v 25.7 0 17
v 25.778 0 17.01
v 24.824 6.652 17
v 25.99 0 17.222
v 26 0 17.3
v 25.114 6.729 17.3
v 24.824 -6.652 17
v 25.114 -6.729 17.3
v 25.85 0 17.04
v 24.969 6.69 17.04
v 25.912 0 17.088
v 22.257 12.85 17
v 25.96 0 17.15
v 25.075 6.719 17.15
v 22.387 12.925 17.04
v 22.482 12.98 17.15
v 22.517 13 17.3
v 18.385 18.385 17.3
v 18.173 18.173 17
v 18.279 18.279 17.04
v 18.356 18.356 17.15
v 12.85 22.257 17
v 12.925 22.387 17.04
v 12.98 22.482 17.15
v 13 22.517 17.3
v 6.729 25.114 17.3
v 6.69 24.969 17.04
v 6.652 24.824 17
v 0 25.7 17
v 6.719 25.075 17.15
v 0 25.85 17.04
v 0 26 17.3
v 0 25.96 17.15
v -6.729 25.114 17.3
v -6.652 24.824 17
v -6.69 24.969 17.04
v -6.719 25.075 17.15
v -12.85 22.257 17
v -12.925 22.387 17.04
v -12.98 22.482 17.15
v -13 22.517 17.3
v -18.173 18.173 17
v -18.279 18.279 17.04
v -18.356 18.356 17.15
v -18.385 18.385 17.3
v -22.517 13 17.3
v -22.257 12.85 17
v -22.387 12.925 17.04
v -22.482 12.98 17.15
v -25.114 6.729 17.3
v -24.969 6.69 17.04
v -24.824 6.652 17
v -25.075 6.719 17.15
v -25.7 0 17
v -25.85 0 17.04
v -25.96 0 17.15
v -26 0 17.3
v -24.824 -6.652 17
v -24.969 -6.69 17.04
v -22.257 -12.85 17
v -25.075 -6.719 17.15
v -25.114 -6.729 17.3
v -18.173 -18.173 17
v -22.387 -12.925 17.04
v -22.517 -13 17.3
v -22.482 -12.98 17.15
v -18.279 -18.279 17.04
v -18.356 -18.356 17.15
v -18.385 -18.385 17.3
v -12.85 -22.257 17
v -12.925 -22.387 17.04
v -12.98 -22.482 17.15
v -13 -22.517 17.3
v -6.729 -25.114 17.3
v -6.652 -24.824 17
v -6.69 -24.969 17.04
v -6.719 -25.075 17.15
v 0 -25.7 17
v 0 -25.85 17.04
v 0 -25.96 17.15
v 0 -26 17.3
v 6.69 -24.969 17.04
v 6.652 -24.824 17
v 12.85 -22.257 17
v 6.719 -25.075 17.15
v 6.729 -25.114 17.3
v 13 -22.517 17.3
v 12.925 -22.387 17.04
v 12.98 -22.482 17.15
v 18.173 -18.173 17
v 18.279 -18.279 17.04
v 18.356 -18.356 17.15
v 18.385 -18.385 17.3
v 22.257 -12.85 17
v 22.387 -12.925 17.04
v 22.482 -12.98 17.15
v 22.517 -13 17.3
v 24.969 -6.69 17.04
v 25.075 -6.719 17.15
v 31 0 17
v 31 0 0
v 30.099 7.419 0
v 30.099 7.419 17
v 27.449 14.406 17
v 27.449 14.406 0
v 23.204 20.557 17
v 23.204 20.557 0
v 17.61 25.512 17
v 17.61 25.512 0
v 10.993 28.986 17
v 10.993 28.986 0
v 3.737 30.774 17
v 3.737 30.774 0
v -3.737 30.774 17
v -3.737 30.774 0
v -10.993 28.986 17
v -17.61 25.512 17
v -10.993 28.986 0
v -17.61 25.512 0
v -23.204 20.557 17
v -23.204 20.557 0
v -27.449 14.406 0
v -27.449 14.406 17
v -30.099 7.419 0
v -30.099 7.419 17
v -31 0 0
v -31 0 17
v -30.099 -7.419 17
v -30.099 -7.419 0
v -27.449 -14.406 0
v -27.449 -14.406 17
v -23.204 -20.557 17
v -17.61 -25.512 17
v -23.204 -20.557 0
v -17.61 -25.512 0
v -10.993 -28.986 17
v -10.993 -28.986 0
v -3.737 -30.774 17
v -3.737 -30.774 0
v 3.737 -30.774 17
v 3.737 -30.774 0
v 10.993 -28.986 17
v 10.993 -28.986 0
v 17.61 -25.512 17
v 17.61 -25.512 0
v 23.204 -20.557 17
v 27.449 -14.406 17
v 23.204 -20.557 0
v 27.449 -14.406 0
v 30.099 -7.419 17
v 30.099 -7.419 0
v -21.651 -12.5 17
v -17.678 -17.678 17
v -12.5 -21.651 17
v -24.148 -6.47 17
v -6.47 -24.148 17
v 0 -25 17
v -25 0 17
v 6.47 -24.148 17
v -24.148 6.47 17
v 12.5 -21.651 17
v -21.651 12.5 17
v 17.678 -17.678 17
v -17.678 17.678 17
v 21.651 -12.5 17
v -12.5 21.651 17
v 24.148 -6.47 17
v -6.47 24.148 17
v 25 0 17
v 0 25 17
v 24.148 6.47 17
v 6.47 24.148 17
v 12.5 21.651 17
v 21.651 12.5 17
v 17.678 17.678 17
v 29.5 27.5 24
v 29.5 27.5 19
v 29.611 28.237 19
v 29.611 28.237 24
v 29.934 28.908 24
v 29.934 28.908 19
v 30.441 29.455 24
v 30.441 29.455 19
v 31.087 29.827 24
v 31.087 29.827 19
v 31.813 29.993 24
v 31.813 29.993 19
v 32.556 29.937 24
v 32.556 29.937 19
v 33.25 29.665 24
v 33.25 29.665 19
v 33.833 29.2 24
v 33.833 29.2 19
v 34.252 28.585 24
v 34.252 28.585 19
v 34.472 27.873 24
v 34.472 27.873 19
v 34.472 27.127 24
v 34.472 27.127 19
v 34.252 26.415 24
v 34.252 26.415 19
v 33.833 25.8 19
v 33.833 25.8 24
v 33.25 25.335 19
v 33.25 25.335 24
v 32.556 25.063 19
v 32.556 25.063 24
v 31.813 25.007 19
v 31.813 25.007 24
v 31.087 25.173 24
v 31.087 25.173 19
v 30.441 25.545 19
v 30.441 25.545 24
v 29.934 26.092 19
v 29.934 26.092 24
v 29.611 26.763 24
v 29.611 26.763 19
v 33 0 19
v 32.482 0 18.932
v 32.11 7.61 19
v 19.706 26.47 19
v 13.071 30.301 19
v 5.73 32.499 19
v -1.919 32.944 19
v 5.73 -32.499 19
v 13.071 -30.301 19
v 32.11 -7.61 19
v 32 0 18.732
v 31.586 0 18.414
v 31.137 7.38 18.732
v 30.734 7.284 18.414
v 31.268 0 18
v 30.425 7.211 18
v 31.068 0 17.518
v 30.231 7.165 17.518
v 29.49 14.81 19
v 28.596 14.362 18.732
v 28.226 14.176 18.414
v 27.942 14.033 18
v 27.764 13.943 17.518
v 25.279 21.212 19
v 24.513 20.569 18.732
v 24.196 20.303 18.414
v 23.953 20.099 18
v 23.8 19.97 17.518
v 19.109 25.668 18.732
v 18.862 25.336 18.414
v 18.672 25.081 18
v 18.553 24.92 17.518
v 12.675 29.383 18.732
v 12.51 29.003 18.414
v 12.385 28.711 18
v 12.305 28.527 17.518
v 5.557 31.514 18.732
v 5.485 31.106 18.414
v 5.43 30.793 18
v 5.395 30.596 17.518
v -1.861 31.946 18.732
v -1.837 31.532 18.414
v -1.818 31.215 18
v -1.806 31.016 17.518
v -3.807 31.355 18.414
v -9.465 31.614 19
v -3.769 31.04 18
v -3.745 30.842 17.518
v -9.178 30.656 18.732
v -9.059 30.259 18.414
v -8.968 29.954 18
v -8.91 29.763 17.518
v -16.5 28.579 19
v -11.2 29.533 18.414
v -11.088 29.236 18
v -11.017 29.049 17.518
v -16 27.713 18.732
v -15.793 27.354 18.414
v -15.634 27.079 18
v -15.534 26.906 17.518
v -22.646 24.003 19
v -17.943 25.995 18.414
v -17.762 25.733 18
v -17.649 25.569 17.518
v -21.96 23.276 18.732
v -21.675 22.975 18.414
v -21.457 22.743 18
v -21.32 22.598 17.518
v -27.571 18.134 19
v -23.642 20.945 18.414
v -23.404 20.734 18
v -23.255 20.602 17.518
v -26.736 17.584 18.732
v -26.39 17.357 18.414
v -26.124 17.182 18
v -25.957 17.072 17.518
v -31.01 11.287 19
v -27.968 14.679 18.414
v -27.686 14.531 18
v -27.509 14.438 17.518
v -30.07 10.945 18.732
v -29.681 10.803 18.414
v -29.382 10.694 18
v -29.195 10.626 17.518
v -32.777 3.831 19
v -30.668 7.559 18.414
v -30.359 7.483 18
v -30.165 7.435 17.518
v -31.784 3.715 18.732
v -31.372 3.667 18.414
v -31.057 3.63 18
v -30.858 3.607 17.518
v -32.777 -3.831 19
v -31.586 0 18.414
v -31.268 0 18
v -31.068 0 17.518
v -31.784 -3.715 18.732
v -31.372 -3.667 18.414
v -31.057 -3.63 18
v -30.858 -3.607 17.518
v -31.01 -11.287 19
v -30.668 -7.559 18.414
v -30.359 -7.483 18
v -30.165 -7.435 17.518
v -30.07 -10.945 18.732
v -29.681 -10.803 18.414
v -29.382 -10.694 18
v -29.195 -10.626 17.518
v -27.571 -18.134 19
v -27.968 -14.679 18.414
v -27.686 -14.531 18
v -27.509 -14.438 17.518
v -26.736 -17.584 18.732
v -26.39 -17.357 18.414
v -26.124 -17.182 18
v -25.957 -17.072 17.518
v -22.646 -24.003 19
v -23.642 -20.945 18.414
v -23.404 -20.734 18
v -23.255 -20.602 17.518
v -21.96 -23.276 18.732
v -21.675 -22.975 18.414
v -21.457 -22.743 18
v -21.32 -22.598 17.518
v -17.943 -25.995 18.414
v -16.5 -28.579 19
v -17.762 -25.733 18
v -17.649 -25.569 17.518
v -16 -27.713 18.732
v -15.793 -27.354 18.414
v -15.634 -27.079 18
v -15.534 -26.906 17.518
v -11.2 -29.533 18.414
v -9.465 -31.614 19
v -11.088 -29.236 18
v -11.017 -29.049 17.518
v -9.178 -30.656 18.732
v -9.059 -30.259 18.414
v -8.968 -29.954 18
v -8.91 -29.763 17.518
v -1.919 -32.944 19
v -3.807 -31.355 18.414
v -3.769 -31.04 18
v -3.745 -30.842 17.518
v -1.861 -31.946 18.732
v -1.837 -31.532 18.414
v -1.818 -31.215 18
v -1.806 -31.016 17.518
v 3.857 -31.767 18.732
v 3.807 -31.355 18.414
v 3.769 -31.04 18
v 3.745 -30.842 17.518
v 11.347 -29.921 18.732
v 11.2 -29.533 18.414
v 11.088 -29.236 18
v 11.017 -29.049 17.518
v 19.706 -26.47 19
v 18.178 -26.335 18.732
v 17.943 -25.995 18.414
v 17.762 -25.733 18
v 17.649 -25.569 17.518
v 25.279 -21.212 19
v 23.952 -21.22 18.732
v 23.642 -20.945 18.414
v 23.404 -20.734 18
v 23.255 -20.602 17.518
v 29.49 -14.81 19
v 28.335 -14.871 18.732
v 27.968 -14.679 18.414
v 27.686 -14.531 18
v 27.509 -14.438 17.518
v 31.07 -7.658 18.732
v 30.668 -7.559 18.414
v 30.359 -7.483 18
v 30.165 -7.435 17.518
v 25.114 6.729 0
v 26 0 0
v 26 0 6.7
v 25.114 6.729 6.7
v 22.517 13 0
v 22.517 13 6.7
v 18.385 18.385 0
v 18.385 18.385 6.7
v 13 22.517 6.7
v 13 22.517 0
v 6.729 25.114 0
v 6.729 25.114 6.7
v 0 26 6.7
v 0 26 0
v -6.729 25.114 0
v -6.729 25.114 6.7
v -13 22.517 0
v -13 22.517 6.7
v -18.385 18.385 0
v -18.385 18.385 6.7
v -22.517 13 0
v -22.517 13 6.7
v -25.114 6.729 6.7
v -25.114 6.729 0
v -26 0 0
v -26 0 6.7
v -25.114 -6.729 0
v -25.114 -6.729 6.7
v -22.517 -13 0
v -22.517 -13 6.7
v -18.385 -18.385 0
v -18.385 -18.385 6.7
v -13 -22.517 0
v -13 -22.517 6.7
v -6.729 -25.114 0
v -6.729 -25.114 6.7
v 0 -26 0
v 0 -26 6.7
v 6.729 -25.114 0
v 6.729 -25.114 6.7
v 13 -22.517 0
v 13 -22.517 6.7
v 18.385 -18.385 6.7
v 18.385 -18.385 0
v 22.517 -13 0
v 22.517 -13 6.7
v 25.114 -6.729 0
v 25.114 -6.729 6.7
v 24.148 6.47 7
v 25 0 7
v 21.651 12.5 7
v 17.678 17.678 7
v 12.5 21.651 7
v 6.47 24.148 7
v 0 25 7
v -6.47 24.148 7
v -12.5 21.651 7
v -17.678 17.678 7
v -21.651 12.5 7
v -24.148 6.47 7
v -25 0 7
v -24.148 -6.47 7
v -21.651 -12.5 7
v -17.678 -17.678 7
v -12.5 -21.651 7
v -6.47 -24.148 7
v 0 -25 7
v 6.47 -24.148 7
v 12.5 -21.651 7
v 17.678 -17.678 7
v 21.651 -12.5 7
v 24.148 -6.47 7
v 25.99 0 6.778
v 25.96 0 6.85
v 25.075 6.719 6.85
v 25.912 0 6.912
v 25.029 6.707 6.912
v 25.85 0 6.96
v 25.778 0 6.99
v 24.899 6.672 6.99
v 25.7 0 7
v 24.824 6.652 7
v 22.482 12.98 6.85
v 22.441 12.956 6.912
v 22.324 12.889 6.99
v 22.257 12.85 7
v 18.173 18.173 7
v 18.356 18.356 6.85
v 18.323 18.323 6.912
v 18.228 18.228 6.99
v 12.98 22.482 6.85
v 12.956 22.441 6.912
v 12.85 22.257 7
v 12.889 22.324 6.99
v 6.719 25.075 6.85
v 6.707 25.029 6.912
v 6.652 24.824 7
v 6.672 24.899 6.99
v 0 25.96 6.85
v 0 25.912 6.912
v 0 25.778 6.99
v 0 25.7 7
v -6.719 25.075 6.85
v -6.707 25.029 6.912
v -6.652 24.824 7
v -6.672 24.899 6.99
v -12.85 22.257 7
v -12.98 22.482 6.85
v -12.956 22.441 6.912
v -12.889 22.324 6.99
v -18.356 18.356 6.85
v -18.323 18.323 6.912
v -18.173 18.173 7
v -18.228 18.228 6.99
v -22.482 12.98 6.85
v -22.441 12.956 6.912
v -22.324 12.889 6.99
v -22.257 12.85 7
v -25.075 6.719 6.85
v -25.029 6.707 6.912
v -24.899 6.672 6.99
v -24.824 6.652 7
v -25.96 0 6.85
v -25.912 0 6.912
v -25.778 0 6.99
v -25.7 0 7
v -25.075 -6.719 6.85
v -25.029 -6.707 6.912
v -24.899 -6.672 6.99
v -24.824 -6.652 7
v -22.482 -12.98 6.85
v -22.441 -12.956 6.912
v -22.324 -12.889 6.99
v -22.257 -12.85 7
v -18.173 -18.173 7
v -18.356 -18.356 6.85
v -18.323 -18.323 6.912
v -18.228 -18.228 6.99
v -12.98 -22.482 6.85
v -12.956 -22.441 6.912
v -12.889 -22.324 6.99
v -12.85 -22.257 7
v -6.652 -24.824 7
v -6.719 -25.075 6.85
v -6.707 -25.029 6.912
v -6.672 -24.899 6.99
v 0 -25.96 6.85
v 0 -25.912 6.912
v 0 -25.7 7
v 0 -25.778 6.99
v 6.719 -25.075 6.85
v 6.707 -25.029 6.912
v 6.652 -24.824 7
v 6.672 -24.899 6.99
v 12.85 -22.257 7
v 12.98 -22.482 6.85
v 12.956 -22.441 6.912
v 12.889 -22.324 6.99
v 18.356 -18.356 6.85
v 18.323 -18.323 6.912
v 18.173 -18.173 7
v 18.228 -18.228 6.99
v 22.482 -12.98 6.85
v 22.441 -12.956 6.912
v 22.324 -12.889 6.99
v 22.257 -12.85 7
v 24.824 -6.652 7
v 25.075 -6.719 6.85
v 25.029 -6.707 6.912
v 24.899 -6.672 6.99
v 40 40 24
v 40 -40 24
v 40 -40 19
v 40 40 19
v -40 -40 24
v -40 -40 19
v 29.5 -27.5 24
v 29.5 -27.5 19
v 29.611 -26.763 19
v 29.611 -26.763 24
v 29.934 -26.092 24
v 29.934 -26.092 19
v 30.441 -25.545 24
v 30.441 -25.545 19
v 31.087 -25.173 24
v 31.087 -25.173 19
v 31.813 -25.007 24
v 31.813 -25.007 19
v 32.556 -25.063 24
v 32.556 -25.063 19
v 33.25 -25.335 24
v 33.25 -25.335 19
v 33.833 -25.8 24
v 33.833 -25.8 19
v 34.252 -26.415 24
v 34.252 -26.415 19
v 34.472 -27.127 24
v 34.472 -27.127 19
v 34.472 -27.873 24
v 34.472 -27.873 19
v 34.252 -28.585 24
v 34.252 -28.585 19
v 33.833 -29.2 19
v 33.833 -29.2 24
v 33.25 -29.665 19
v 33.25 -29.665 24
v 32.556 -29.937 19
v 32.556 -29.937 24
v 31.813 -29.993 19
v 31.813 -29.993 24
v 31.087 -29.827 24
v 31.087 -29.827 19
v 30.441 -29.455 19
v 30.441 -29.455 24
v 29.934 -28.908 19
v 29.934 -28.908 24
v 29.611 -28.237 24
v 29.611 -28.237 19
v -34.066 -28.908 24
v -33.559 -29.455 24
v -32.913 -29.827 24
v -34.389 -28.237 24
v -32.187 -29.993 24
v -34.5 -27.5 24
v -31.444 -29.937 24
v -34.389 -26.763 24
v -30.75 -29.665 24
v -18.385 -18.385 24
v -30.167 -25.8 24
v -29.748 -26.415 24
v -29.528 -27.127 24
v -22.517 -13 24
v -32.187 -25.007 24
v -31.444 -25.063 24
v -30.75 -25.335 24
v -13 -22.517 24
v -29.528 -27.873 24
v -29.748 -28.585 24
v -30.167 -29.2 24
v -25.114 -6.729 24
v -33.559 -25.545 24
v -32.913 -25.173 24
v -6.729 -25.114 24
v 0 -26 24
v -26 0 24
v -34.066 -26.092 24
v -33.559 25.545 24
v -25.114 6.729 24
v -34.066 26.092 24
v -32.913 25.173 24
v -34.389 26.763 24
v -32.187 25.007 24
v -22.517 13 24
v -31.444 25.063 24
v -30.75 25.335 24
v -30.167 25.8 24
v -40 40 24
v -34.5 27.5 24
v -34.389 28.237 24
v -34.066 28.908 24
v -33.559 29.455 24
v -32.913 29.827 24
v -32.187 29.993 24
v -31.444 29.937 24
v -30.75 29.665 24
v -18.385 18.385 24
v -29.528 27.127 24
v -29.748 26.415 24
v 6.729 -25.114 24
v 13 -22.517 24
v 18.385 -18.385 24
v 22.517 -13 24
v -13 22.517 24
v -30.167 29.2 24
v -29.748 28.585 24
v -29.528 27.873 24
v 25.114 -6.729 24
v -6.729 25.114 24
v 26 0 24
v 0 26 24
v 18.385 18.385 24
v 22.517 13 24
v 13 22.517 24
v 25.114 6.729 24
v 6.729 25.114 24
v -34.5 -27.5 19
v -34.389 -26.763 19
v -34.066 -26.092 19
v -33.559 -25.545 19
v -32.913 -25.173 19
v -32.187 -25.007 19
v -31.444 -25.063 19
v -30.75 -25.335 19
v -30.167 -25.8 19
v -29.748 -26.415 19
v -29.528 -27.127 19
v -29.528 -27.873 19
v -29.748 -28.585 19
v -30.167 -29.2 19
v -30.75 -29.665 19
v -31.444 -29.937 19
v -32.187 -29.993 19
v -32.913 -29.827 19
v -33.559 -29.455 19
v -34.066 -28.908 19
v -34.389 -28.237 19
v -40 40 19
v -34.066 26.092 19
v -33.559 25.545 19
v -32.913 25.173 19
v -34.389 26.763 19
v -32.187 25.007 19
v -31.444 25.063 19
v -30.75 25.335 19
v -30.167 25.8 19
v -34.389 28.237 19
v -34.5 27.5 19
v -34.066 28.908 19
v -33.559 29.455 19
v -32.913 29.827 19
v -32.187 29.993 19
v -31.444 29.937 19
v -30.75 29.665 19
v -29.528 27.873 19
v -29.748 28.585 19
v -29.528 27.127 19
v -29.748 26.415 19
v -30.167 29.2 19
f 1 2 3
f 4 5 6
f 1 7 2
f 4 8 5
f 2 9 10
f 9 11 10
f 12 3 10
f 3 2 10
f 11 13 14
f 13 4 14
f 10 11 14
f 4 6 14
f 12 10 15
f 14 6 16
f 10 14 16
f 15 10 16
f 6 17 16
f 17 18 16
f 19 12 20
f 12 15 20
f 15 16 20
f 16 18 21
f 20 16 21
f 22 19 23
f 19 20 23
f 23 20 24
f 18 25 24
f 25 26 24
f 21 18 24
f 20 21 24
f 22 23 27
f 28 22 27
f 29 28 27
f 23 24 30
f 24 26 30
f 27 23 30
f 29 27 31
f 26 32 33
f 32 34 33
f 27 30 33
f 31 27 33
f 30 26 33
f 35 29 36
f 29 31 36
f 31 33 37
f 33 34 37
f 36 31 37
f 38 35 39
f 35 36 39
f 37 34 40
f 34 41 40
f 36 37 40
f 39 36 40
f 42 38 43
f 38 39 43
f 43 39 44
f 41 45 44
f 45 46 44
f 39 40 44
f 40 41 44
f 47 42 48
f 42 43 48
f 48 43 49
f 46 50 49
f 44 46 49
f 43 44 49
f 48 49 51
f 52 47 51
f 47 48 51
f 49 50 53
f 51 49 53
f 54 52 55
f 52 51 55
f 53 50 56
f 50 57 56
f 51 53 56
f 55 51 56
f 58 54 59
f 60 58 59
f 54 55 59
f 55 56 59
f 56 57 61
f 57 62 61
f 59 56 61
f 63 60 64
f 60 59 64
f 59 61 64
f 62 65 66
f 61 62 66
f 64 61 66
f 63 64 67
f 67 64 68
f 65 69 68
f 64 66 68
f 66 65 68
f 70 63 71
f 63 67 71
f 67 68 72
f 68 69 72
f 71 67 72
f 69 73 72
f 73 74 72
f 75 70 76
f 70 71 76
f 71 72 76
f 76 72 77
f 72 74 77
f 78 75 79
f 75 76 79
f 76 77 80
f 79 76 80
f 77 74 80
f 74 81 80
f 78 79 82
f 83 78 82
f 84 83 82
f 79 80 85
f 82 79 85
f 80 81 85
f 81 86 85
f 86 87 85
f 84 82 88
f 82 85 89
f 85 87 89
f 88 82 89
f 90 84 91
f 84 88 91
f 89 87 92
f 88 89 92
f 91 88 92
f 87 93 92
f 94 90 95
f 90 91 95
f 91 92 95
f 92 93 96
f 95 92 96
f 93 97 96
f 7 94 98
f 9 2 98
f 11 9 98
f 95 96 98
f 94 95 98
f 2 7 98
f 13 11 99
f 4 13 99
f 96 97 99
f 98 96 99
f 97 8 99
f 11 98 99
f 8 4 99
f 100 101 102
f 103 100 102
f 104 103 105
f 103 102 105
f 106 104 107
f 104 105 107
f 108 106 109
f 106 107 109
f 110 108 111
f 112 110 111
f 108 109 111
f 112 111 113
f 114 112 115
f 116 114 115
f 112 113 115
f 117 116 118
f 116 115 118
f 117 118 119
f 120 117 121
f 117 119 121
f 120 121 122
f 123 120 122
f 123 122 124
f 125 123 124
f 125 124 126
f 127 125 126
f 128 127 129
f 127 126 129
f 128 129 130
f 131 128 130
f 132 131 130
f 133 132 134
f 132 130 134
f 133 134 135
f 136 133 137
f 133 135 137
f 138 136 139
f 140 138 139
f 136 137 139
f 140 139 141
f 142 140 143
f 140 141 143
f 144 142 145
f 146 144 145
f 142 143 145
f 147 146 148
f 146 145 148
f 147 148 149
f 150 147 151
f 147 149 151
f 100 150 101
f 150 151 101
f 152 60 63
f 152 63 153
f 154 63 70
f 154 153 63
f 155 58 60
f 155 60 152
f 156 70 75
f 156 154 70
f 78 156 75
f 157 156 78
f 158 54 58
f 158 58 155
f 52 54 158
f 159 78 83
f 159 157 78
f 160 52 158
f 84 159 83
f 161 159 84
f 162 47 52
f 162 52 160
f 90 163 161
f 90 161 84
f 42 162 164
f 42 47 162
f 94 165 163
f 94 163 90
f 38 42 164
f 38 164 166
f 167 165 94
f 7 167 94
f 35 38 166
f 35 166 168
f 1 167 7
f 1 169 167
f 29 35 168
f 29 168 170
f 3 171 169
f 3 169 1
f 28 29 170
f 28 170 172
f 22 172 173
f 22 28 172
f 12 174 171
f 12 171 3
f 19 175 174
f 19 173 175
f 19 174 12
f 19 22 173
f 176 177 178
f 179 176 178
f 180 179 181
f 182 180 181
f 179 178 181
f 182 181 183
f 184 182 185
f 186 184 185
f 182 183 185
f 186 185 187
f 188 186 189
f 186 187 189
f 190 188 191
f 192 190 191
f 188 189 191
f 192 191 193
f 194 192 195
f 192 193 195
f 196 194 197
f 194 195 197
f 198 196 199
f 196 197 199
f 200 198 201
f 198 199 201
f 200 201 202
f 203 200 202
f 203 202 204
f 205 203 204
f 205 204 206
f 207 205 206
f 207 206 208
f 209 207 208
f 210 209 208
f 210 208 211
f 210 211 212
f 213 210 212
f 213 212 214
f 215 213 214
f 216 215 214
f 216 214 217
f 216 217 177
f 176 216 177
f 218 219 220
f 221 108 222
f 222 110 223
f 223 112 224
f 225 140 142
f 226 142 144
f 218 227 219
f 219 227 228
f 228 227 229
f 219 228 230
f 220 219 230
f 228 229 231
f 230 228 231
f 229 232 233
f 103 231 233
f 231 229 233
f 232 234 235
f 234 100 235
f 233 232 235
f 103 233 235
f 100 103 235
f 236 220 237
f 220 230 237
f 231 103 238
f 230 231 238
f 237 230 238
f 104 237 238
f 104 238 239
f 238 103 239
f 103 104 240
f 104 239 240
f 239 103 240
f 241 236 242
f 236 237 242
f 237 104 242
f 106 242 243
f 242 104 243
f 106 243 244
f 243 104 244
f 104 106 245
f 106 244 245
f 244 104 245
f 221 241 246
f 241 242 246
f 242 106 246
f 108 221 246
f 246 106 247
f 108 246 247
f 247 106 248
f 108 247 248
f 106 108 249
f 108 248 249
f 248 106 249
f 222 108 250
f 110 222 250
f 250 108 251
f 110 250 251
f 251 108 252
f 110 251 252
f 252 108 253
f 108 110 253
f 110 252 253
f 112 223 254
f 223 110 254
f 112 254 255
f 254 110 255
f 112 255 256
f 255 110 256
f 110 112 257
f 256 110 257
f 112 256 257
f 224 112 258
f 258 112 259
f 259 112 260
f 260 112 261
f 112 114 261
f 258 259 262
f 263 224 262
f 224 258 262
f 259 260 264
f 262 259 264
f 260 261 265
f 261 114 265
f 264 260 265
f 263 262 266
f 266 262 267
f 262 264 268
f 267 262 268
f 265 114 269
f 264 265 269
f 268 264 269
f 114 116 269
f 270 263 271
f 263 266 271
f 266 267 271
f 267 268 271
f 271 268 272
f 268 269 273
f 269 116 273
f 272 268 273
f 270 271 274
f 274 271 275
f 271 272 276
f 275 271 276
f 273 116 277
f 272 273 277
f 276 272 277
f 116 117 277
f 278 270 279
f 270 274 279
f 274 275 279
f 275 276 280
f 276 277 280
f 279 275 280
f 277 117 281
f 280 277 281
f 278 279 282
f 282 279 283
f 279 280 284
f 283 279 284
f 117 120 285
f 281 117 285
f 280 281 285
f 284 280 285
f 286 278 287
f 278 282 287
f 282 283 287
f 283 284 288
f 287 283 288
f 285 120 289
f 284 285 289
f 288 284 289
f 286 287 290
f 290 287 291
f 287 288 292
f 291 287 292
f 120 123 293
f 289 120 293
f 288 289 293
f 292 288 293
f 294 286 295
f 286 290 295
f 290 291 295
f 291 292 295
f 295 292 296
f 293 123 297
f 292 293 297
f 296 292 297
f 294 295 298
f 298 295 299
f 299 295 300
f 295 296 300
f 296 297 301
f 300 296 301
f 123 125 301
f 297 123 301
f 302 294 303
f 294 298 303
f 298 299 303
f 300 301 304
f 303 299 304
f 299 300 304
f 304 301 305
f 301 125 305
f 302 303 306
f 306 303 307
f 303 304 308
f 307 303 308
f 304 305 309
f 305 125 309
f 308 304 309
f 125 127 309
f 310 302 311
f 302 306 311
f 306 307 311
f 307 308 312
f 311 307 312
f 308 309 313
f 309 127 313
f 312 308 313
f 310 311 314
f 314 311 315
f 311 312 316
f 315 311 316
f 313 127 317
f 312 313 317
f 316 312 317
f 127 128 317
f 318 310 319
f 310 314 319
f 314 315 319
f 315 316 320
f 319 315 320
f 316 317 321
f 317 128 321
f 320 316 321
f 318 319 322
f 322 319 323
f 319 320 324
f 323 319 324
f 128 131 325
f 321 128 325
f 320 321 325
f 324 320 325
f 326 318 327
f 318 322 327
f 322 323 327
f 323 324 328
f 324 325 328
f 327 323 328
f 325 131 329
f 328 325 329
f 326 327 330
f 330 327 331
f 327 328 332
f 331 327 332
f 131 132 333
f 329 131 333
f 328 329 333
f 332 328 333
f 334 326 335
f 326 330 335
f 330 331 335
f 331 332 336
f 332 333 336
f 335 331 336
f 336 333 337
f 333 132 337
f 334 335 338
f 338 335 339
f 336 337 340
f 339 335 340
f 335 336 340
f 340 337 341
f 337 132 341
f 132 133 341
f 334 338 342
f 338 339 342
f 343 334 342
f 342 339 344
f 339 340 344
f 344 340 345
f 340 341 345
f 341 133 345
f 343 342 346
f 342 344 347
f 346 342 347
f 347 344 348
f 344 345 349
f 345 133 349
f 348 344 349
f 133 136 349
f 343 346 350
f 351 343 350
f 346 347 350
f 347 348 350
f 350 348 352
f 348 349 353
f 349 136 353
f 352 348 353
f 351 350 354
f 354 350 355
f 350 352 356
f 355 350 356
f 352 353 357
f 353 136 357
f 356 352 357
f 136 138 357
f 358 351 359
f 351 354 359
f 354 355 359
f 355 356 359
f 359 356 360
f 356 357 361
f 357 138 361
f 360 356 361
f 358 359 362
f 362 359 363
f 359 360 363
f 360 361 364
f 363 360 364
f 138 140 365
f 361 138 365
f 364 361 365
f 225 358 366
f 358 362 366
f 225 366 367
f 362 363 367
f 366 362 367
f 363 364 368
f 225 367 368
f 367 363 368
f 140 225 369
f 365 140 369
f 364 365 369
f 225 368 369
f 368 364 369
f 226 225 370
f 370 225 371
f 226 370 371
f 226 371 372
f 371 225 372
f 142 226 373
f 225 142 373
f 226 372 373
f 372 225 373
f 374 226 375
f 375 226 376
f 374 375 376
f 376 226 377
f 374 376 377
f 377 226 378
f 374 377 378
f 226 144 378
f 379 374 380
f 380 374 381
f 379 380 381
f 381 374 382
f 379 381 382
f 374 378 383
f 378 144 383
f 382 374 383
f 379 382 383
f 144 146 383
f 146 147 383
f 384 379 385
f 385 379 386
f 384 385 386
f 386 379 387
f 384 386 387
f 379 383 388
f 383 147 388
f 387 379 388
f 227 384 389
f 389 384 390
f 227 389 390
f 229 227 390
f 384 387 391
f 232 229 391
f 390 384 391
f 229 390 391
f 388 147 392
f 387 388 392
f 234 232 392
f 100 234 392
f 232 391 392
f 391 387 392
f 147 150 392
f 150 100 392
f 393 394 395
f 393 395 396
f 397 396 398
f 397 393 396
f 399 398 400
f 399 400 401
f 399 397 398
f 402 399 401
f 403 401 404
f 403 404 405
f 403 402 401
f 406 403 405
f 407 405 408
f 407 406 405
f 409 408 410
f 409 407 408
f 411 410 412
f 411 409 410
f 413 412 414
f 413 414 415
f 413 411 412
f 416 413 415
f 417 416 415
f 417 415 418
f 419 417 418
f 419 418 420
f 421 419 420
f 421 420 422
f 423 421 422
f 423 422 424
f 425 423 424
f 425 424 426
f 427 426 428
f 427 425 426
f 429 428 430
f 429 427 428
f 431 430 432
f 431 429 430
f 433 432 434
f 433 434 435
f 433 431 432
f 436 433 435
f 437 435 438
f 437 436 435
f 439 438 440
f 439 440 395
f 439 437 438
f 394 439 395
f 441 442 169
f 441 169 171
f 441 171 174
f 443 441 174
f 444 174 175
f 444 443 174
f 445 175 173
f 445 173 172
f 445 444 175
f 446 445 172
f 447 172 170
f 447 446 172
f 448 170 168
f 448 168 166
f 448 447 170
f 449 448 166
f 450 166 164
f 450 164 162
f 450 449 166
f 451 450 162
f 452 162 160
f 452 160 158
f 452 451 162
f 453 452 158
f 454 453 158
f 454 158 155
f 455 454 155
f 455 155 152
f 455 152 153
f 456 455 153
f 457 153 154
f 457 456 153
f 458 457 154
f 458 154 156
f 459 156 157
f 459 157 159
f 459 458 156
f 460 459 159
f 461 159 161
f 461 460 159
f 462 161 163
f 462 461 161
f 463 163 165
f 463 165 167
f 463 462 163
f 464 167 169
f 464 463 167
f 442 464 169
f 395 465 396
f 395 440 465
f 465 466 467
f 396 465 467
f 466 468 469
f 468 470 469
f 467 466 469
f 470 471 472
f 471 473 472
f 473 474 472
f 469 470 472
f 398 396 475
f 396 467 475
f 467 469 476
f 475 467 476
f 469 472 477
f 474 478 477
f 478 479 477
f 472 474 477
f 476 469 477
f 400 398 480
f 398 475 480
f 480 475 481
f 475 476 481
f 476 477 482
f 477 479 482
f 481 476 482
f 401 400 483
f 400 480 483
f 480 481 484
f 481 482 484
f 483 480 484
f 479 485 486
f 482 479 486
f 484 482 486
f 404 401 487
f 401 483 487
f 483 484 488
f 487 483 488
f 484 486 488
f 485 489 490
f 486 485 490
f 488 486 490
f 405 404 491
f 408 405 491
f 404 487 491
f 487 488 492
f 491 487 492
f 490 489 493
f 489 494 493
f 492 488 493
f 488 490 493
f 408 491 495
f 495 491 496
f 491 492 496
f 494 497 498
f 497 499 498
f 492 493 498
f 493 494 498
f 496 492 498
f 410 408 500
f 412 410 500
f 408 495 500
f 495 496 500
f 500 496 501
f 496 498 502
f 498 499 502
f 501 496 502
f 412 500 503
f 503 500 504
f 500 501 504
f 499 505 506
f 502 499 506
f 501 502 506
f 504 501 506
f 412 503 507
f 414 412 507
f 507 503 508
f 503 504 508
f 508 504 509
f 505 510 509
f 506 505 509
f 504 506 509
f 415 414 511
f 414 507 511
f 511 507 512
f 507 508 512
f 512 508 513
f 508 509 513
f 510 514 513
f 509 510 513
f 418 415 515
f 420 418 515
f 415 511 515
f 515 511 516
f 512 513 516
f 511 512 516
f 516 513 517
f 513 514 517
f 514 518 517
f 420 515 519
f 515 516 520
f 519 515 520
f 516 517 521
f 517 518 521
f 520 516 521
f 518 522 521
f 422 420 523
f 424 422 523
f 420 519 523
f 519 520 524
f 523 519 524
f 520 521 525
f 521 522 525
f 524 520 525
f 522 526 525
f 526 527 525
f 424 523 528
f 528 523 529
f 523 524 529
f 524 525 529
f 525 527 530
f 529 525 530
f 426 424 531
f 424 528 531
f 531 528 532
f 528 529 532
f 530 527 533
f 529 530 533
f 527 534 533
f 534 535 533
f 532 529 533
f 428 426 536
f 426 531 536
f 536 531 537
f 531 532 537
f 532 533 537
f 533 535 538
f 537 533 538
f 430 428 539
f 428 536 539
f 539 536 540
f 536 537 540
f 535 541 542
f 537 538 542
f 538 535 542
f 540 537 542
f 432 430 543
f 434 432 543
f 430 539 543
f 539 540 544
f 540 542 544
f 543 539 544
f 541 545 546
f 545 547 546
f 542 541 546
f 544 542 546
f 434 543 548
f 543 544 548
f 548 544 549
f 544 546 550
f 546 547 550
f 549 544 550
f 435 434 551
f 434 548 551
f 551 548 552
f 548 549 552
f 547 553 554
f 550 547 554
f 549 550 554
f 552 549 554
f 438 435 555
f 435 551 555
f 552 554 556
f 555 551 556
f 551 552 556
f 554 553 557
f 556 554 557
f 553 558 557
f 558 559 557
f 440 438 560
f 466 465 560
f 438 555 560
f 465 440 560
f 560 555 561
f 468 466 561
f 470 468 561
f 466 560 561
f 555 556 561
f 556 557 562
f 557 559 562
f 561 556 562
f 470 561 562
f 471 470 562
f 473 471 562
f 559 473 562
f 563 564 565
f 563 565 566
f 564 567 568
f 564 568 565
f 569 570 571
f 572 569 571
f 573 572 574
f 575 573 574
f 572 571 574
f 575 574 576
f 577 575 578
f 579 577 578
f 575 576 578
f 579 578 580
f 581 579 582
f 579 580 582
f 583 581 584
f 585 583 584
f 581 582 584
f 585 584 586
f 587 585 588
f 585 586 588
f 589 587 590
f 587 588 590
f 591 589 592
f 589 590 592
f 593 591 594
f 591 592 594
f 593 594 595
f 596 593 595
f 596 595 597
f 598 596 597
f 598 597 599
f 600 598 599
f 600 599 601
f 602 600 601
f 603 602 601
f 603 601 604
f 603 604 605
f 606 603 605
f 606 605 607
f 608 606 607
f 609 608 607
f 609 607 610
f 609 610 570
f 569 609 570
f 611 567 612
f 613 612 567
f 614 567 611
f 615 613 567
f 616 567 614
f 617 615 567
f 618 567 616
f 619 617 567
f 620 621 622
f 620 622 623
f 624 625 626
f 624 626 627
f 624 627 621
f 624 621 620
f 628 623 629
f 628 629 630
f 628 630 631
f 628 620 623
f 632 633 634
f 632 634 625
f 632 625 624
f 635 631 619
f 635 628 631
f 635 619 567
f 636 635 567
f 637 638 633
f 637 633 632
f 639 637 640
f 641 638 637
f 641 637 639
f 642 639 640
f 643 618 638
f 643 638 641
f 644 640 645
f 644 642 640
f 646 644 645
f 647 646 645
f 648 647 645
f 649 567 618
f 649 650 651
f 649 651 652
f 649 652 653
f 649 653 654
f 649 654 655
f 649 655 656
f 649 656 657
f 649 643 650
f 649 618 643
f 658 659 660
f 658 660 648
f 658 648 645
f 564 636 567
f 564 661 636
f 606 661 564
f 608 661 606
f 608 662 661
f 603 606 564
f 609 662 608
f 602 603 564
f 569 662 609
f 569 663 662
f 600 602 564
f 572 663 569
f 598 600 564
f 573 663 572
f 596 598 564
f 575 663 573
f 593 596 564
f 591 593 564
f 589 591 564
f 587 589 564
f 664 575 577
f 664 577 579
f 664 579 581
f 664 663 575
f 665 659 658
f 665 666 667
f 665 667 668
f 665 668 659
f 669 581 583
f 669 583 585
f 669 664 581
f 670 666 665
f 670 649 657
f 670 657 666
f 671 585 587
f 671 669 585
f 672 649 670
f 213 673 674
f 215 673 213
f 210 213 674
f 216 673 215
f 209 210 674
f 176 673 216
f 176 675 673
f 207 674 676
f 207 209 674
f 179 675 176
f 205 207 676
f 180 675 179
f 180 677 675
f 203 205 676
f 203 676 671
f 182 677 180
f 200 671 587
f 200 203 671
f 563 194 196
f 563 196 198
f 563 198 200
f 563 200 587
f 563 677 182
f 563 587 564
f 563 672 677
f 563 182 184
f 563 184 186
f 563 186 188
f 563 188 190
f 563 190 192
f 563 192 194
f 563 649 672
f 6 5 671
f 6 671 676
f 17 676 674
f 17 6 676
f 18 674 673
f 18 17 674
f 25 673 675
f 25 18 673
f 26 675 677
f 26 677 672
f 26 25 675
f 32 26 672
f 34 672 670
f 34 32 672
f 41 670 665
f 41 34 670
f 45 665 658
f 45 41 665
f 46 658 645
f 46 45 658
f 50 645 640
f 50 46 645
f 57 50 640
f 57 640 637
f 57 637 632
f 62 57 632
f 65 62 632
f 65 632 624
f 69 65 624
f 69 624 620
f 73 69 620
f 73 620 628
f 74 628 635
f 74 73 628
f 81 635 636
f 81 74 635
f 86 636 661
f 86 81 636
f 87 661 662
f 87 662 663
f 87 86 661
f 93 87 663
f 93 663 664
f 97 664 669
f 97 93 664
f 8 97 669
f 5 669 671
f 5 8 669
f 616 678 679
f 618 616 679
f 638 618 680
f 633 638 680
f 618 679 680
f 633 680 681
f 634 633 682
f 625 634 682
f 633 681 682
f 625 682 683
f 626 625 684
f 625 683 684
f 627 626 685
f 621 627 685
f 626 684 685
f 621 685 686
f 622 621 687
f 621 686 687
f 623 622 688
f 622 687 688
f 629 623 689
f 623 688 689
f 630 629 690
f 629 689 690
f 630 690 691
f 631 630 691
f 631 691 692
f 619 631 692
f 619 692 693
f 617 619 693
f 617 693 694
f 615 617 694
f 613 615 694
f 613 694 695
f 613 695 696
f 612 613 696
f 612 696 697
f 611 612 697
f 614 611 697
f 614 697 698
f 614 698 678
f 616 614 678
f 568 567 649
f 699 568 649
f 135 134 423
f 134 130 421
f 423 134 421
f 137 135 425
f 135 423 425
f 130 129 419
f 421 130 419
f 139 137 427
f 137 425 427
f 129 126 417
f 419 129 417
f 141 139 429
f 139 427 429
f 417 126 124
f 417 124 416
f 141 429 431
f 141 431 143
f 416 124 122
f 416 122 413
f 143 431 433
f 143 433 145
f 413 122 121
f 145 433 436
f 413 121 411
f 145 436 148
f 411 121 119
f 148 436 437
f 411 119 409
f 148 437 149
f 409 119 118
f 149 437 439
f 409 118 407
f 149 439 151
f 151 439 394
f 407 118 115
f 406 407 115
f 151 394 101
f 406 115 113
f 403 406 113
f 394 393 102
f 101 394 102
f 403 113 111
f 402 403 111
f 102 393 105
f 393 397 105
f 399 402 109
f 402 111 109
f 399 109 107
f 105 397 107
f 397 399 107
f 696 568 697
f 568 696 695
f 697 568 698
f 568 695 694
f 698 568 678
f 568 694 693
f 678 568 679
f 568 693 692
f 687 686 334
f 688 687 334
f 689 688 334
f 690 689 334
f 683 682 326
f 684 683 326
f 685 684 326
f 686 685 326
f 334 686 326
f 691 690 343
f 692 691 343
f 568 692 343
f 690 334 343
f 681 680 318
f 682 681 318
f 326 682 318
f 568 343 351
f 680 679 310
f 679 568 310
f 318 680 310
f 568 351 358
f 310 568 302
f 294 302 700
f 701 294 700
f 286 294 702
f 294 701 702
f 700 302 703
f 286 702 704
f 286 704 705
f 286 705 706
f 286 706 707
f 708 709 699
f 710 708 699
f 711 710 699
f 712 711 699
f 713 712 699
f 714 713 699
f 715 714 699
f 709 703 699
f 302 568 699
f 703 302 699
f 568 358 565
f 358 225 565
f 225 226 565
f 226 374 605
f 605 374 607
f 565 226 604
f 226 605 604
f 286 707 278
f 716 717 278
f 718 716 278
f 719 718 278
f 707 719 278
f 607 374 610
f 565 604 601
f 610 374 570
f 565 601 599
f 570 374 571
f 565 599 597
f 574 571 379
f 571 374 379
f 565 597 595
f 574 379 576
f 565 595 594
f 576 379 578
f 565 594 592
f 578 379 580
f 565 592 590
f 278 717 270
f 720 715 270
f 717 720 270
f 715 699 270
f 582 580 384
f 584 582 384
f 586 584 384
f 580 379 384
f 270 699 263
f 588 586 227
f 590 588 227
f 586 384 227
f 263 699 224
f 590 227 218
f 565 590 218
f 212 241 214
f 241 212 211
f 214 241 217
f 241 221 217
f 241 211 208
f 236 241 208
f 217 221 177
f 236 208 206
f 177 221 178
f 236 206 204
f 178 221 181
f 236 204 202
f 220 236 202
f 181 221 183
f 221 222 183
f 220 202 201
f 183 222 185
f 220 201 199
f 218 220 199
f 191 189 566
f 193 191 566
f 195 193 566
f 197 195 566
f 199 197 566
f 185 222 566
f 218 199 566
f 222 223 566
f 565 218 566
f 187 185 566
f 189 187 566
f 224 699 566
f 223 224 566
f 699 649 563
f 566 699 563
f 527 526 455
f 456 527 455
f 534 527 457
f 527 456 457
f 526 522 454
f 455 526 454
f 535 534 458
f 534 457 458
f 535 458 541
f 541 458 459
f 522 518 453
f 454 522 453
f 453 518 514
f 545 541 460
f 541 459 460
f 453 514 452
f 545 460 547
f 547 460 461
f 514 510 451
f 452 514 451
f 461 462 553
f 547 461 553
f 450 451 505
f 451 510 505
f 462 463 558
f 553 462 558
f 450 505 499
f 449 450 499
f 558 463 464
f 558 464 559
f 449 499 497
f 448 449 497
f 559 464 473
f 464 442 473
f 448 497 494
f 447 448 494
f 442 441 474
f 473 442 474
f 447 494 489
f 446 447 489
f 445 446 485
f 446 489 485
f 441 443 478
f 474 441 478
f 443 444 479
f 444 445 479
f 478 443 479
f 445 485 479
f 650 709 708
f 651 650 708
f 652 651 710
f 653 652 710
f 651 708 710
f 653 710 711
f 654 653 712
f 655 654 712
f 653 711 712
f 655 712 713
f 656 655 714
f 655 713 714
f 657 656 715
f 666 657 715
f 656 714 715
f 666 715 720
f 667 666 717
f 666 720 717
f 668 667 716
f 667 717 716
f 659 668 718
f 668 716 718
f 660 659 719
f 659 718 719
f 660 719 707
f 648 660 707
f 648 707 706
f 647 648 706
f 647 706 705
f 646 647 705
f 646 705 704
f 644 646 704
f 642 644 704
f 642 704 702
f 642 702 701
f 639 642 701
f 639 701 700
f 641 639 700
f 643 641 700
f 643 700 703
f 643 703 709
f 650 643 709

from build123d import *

# Parameters (mm, degrees)
SKETCH1_R             = 31
SKETCH1_R_2           = 26
BOSS_EXTRUDE1_DEPTH   = 7
SKETCH2_R             = 31
SKETCH2_R_2           = 25
BOSS_EXTRUDE3_DEPTH   = 10
SKETCH3_R             = 31
SKETCH3_R_2           = 26
BOSS_EXTRUDE4_DEPTH   = 7
FILLET1_R             = 0.3
SKETCH4_W             = 80
SKETCH4_H             = 80
SKETCH4_R             = 31
BOSS_EXTRUDE5_DEPTH   = 5
FILLET2_R             = 2
M6X1_0_TAPPED_HOLE1_D = 5


with BuildPart() as part:
    # Sketch1 → Boss-Extrude1 (new body)
    with BuildSketch(Plane.XY):
        Circle(SKETCH1_R)
        Circle(SKETCH1_R_2, mode=Mode.SUBTRACT)
    extrude(amount=BOSS_EXTRUDE1_DEPTH)

    # Sketch2 → Boss-Extrude3 (add)
    with BuildSketch(Plane.XY.offset(7)):
        Circle(SKETCH2_R)
        Circle(SKETCH2_R_2, mode=Mode.SUBTRACT)
    extrude(amount=BOSS_EXTRUDE3_DEPTH)

    # Sketch3 → Boss-Extrude4 (add)
    with BuildSketch(Plane.XY.offset(17)):
        Circle(SKETCH3_R)
        Circle(SKETCH3_R_2, mode=Mode.SUBTRACT)
    extrude(amount=BOSS_EXTRUDE4_DEPTH)

    # Fillet1
    fillet1_edges = [part.edges().sort_by_distance(p)[0] for p in [
        (-26, 0, 7),
        (-26, 0, 17),
    ]]
    fillet(fillet1_edges, radius=FILLET1_R)

    # Sketch4 → Boss-Extrude5 (add)
    with BuildSketch(Plane.XY.offset(24)):
        Rectangle(SKETCH4_W, SKETCH4_H)
        Circle(SKETCH4_R, mode=Mode.SUBTRACT)
    extrude(amount=-BOSS_EXTRUDE5_DEPTH)

    # Fillet2
    fillet2_edges = [part.edges().sort_by_distance(p)[0] for p in [
        (-31, 0, 19),
    ]]
    fillet(fillet2_edges, radius=FILLET2_R)

    # M6x1.0 Tapped Hole1 (through all)
    with Locations(Plane.XY.offset(24)):
        with Locations((-32, 27.5), (32, 27.5), (32, -27.5), (-32, -27.5)):
            Hole(M6X1_0_TAPPED_HOLE1_D / 2)


solid = part.part
